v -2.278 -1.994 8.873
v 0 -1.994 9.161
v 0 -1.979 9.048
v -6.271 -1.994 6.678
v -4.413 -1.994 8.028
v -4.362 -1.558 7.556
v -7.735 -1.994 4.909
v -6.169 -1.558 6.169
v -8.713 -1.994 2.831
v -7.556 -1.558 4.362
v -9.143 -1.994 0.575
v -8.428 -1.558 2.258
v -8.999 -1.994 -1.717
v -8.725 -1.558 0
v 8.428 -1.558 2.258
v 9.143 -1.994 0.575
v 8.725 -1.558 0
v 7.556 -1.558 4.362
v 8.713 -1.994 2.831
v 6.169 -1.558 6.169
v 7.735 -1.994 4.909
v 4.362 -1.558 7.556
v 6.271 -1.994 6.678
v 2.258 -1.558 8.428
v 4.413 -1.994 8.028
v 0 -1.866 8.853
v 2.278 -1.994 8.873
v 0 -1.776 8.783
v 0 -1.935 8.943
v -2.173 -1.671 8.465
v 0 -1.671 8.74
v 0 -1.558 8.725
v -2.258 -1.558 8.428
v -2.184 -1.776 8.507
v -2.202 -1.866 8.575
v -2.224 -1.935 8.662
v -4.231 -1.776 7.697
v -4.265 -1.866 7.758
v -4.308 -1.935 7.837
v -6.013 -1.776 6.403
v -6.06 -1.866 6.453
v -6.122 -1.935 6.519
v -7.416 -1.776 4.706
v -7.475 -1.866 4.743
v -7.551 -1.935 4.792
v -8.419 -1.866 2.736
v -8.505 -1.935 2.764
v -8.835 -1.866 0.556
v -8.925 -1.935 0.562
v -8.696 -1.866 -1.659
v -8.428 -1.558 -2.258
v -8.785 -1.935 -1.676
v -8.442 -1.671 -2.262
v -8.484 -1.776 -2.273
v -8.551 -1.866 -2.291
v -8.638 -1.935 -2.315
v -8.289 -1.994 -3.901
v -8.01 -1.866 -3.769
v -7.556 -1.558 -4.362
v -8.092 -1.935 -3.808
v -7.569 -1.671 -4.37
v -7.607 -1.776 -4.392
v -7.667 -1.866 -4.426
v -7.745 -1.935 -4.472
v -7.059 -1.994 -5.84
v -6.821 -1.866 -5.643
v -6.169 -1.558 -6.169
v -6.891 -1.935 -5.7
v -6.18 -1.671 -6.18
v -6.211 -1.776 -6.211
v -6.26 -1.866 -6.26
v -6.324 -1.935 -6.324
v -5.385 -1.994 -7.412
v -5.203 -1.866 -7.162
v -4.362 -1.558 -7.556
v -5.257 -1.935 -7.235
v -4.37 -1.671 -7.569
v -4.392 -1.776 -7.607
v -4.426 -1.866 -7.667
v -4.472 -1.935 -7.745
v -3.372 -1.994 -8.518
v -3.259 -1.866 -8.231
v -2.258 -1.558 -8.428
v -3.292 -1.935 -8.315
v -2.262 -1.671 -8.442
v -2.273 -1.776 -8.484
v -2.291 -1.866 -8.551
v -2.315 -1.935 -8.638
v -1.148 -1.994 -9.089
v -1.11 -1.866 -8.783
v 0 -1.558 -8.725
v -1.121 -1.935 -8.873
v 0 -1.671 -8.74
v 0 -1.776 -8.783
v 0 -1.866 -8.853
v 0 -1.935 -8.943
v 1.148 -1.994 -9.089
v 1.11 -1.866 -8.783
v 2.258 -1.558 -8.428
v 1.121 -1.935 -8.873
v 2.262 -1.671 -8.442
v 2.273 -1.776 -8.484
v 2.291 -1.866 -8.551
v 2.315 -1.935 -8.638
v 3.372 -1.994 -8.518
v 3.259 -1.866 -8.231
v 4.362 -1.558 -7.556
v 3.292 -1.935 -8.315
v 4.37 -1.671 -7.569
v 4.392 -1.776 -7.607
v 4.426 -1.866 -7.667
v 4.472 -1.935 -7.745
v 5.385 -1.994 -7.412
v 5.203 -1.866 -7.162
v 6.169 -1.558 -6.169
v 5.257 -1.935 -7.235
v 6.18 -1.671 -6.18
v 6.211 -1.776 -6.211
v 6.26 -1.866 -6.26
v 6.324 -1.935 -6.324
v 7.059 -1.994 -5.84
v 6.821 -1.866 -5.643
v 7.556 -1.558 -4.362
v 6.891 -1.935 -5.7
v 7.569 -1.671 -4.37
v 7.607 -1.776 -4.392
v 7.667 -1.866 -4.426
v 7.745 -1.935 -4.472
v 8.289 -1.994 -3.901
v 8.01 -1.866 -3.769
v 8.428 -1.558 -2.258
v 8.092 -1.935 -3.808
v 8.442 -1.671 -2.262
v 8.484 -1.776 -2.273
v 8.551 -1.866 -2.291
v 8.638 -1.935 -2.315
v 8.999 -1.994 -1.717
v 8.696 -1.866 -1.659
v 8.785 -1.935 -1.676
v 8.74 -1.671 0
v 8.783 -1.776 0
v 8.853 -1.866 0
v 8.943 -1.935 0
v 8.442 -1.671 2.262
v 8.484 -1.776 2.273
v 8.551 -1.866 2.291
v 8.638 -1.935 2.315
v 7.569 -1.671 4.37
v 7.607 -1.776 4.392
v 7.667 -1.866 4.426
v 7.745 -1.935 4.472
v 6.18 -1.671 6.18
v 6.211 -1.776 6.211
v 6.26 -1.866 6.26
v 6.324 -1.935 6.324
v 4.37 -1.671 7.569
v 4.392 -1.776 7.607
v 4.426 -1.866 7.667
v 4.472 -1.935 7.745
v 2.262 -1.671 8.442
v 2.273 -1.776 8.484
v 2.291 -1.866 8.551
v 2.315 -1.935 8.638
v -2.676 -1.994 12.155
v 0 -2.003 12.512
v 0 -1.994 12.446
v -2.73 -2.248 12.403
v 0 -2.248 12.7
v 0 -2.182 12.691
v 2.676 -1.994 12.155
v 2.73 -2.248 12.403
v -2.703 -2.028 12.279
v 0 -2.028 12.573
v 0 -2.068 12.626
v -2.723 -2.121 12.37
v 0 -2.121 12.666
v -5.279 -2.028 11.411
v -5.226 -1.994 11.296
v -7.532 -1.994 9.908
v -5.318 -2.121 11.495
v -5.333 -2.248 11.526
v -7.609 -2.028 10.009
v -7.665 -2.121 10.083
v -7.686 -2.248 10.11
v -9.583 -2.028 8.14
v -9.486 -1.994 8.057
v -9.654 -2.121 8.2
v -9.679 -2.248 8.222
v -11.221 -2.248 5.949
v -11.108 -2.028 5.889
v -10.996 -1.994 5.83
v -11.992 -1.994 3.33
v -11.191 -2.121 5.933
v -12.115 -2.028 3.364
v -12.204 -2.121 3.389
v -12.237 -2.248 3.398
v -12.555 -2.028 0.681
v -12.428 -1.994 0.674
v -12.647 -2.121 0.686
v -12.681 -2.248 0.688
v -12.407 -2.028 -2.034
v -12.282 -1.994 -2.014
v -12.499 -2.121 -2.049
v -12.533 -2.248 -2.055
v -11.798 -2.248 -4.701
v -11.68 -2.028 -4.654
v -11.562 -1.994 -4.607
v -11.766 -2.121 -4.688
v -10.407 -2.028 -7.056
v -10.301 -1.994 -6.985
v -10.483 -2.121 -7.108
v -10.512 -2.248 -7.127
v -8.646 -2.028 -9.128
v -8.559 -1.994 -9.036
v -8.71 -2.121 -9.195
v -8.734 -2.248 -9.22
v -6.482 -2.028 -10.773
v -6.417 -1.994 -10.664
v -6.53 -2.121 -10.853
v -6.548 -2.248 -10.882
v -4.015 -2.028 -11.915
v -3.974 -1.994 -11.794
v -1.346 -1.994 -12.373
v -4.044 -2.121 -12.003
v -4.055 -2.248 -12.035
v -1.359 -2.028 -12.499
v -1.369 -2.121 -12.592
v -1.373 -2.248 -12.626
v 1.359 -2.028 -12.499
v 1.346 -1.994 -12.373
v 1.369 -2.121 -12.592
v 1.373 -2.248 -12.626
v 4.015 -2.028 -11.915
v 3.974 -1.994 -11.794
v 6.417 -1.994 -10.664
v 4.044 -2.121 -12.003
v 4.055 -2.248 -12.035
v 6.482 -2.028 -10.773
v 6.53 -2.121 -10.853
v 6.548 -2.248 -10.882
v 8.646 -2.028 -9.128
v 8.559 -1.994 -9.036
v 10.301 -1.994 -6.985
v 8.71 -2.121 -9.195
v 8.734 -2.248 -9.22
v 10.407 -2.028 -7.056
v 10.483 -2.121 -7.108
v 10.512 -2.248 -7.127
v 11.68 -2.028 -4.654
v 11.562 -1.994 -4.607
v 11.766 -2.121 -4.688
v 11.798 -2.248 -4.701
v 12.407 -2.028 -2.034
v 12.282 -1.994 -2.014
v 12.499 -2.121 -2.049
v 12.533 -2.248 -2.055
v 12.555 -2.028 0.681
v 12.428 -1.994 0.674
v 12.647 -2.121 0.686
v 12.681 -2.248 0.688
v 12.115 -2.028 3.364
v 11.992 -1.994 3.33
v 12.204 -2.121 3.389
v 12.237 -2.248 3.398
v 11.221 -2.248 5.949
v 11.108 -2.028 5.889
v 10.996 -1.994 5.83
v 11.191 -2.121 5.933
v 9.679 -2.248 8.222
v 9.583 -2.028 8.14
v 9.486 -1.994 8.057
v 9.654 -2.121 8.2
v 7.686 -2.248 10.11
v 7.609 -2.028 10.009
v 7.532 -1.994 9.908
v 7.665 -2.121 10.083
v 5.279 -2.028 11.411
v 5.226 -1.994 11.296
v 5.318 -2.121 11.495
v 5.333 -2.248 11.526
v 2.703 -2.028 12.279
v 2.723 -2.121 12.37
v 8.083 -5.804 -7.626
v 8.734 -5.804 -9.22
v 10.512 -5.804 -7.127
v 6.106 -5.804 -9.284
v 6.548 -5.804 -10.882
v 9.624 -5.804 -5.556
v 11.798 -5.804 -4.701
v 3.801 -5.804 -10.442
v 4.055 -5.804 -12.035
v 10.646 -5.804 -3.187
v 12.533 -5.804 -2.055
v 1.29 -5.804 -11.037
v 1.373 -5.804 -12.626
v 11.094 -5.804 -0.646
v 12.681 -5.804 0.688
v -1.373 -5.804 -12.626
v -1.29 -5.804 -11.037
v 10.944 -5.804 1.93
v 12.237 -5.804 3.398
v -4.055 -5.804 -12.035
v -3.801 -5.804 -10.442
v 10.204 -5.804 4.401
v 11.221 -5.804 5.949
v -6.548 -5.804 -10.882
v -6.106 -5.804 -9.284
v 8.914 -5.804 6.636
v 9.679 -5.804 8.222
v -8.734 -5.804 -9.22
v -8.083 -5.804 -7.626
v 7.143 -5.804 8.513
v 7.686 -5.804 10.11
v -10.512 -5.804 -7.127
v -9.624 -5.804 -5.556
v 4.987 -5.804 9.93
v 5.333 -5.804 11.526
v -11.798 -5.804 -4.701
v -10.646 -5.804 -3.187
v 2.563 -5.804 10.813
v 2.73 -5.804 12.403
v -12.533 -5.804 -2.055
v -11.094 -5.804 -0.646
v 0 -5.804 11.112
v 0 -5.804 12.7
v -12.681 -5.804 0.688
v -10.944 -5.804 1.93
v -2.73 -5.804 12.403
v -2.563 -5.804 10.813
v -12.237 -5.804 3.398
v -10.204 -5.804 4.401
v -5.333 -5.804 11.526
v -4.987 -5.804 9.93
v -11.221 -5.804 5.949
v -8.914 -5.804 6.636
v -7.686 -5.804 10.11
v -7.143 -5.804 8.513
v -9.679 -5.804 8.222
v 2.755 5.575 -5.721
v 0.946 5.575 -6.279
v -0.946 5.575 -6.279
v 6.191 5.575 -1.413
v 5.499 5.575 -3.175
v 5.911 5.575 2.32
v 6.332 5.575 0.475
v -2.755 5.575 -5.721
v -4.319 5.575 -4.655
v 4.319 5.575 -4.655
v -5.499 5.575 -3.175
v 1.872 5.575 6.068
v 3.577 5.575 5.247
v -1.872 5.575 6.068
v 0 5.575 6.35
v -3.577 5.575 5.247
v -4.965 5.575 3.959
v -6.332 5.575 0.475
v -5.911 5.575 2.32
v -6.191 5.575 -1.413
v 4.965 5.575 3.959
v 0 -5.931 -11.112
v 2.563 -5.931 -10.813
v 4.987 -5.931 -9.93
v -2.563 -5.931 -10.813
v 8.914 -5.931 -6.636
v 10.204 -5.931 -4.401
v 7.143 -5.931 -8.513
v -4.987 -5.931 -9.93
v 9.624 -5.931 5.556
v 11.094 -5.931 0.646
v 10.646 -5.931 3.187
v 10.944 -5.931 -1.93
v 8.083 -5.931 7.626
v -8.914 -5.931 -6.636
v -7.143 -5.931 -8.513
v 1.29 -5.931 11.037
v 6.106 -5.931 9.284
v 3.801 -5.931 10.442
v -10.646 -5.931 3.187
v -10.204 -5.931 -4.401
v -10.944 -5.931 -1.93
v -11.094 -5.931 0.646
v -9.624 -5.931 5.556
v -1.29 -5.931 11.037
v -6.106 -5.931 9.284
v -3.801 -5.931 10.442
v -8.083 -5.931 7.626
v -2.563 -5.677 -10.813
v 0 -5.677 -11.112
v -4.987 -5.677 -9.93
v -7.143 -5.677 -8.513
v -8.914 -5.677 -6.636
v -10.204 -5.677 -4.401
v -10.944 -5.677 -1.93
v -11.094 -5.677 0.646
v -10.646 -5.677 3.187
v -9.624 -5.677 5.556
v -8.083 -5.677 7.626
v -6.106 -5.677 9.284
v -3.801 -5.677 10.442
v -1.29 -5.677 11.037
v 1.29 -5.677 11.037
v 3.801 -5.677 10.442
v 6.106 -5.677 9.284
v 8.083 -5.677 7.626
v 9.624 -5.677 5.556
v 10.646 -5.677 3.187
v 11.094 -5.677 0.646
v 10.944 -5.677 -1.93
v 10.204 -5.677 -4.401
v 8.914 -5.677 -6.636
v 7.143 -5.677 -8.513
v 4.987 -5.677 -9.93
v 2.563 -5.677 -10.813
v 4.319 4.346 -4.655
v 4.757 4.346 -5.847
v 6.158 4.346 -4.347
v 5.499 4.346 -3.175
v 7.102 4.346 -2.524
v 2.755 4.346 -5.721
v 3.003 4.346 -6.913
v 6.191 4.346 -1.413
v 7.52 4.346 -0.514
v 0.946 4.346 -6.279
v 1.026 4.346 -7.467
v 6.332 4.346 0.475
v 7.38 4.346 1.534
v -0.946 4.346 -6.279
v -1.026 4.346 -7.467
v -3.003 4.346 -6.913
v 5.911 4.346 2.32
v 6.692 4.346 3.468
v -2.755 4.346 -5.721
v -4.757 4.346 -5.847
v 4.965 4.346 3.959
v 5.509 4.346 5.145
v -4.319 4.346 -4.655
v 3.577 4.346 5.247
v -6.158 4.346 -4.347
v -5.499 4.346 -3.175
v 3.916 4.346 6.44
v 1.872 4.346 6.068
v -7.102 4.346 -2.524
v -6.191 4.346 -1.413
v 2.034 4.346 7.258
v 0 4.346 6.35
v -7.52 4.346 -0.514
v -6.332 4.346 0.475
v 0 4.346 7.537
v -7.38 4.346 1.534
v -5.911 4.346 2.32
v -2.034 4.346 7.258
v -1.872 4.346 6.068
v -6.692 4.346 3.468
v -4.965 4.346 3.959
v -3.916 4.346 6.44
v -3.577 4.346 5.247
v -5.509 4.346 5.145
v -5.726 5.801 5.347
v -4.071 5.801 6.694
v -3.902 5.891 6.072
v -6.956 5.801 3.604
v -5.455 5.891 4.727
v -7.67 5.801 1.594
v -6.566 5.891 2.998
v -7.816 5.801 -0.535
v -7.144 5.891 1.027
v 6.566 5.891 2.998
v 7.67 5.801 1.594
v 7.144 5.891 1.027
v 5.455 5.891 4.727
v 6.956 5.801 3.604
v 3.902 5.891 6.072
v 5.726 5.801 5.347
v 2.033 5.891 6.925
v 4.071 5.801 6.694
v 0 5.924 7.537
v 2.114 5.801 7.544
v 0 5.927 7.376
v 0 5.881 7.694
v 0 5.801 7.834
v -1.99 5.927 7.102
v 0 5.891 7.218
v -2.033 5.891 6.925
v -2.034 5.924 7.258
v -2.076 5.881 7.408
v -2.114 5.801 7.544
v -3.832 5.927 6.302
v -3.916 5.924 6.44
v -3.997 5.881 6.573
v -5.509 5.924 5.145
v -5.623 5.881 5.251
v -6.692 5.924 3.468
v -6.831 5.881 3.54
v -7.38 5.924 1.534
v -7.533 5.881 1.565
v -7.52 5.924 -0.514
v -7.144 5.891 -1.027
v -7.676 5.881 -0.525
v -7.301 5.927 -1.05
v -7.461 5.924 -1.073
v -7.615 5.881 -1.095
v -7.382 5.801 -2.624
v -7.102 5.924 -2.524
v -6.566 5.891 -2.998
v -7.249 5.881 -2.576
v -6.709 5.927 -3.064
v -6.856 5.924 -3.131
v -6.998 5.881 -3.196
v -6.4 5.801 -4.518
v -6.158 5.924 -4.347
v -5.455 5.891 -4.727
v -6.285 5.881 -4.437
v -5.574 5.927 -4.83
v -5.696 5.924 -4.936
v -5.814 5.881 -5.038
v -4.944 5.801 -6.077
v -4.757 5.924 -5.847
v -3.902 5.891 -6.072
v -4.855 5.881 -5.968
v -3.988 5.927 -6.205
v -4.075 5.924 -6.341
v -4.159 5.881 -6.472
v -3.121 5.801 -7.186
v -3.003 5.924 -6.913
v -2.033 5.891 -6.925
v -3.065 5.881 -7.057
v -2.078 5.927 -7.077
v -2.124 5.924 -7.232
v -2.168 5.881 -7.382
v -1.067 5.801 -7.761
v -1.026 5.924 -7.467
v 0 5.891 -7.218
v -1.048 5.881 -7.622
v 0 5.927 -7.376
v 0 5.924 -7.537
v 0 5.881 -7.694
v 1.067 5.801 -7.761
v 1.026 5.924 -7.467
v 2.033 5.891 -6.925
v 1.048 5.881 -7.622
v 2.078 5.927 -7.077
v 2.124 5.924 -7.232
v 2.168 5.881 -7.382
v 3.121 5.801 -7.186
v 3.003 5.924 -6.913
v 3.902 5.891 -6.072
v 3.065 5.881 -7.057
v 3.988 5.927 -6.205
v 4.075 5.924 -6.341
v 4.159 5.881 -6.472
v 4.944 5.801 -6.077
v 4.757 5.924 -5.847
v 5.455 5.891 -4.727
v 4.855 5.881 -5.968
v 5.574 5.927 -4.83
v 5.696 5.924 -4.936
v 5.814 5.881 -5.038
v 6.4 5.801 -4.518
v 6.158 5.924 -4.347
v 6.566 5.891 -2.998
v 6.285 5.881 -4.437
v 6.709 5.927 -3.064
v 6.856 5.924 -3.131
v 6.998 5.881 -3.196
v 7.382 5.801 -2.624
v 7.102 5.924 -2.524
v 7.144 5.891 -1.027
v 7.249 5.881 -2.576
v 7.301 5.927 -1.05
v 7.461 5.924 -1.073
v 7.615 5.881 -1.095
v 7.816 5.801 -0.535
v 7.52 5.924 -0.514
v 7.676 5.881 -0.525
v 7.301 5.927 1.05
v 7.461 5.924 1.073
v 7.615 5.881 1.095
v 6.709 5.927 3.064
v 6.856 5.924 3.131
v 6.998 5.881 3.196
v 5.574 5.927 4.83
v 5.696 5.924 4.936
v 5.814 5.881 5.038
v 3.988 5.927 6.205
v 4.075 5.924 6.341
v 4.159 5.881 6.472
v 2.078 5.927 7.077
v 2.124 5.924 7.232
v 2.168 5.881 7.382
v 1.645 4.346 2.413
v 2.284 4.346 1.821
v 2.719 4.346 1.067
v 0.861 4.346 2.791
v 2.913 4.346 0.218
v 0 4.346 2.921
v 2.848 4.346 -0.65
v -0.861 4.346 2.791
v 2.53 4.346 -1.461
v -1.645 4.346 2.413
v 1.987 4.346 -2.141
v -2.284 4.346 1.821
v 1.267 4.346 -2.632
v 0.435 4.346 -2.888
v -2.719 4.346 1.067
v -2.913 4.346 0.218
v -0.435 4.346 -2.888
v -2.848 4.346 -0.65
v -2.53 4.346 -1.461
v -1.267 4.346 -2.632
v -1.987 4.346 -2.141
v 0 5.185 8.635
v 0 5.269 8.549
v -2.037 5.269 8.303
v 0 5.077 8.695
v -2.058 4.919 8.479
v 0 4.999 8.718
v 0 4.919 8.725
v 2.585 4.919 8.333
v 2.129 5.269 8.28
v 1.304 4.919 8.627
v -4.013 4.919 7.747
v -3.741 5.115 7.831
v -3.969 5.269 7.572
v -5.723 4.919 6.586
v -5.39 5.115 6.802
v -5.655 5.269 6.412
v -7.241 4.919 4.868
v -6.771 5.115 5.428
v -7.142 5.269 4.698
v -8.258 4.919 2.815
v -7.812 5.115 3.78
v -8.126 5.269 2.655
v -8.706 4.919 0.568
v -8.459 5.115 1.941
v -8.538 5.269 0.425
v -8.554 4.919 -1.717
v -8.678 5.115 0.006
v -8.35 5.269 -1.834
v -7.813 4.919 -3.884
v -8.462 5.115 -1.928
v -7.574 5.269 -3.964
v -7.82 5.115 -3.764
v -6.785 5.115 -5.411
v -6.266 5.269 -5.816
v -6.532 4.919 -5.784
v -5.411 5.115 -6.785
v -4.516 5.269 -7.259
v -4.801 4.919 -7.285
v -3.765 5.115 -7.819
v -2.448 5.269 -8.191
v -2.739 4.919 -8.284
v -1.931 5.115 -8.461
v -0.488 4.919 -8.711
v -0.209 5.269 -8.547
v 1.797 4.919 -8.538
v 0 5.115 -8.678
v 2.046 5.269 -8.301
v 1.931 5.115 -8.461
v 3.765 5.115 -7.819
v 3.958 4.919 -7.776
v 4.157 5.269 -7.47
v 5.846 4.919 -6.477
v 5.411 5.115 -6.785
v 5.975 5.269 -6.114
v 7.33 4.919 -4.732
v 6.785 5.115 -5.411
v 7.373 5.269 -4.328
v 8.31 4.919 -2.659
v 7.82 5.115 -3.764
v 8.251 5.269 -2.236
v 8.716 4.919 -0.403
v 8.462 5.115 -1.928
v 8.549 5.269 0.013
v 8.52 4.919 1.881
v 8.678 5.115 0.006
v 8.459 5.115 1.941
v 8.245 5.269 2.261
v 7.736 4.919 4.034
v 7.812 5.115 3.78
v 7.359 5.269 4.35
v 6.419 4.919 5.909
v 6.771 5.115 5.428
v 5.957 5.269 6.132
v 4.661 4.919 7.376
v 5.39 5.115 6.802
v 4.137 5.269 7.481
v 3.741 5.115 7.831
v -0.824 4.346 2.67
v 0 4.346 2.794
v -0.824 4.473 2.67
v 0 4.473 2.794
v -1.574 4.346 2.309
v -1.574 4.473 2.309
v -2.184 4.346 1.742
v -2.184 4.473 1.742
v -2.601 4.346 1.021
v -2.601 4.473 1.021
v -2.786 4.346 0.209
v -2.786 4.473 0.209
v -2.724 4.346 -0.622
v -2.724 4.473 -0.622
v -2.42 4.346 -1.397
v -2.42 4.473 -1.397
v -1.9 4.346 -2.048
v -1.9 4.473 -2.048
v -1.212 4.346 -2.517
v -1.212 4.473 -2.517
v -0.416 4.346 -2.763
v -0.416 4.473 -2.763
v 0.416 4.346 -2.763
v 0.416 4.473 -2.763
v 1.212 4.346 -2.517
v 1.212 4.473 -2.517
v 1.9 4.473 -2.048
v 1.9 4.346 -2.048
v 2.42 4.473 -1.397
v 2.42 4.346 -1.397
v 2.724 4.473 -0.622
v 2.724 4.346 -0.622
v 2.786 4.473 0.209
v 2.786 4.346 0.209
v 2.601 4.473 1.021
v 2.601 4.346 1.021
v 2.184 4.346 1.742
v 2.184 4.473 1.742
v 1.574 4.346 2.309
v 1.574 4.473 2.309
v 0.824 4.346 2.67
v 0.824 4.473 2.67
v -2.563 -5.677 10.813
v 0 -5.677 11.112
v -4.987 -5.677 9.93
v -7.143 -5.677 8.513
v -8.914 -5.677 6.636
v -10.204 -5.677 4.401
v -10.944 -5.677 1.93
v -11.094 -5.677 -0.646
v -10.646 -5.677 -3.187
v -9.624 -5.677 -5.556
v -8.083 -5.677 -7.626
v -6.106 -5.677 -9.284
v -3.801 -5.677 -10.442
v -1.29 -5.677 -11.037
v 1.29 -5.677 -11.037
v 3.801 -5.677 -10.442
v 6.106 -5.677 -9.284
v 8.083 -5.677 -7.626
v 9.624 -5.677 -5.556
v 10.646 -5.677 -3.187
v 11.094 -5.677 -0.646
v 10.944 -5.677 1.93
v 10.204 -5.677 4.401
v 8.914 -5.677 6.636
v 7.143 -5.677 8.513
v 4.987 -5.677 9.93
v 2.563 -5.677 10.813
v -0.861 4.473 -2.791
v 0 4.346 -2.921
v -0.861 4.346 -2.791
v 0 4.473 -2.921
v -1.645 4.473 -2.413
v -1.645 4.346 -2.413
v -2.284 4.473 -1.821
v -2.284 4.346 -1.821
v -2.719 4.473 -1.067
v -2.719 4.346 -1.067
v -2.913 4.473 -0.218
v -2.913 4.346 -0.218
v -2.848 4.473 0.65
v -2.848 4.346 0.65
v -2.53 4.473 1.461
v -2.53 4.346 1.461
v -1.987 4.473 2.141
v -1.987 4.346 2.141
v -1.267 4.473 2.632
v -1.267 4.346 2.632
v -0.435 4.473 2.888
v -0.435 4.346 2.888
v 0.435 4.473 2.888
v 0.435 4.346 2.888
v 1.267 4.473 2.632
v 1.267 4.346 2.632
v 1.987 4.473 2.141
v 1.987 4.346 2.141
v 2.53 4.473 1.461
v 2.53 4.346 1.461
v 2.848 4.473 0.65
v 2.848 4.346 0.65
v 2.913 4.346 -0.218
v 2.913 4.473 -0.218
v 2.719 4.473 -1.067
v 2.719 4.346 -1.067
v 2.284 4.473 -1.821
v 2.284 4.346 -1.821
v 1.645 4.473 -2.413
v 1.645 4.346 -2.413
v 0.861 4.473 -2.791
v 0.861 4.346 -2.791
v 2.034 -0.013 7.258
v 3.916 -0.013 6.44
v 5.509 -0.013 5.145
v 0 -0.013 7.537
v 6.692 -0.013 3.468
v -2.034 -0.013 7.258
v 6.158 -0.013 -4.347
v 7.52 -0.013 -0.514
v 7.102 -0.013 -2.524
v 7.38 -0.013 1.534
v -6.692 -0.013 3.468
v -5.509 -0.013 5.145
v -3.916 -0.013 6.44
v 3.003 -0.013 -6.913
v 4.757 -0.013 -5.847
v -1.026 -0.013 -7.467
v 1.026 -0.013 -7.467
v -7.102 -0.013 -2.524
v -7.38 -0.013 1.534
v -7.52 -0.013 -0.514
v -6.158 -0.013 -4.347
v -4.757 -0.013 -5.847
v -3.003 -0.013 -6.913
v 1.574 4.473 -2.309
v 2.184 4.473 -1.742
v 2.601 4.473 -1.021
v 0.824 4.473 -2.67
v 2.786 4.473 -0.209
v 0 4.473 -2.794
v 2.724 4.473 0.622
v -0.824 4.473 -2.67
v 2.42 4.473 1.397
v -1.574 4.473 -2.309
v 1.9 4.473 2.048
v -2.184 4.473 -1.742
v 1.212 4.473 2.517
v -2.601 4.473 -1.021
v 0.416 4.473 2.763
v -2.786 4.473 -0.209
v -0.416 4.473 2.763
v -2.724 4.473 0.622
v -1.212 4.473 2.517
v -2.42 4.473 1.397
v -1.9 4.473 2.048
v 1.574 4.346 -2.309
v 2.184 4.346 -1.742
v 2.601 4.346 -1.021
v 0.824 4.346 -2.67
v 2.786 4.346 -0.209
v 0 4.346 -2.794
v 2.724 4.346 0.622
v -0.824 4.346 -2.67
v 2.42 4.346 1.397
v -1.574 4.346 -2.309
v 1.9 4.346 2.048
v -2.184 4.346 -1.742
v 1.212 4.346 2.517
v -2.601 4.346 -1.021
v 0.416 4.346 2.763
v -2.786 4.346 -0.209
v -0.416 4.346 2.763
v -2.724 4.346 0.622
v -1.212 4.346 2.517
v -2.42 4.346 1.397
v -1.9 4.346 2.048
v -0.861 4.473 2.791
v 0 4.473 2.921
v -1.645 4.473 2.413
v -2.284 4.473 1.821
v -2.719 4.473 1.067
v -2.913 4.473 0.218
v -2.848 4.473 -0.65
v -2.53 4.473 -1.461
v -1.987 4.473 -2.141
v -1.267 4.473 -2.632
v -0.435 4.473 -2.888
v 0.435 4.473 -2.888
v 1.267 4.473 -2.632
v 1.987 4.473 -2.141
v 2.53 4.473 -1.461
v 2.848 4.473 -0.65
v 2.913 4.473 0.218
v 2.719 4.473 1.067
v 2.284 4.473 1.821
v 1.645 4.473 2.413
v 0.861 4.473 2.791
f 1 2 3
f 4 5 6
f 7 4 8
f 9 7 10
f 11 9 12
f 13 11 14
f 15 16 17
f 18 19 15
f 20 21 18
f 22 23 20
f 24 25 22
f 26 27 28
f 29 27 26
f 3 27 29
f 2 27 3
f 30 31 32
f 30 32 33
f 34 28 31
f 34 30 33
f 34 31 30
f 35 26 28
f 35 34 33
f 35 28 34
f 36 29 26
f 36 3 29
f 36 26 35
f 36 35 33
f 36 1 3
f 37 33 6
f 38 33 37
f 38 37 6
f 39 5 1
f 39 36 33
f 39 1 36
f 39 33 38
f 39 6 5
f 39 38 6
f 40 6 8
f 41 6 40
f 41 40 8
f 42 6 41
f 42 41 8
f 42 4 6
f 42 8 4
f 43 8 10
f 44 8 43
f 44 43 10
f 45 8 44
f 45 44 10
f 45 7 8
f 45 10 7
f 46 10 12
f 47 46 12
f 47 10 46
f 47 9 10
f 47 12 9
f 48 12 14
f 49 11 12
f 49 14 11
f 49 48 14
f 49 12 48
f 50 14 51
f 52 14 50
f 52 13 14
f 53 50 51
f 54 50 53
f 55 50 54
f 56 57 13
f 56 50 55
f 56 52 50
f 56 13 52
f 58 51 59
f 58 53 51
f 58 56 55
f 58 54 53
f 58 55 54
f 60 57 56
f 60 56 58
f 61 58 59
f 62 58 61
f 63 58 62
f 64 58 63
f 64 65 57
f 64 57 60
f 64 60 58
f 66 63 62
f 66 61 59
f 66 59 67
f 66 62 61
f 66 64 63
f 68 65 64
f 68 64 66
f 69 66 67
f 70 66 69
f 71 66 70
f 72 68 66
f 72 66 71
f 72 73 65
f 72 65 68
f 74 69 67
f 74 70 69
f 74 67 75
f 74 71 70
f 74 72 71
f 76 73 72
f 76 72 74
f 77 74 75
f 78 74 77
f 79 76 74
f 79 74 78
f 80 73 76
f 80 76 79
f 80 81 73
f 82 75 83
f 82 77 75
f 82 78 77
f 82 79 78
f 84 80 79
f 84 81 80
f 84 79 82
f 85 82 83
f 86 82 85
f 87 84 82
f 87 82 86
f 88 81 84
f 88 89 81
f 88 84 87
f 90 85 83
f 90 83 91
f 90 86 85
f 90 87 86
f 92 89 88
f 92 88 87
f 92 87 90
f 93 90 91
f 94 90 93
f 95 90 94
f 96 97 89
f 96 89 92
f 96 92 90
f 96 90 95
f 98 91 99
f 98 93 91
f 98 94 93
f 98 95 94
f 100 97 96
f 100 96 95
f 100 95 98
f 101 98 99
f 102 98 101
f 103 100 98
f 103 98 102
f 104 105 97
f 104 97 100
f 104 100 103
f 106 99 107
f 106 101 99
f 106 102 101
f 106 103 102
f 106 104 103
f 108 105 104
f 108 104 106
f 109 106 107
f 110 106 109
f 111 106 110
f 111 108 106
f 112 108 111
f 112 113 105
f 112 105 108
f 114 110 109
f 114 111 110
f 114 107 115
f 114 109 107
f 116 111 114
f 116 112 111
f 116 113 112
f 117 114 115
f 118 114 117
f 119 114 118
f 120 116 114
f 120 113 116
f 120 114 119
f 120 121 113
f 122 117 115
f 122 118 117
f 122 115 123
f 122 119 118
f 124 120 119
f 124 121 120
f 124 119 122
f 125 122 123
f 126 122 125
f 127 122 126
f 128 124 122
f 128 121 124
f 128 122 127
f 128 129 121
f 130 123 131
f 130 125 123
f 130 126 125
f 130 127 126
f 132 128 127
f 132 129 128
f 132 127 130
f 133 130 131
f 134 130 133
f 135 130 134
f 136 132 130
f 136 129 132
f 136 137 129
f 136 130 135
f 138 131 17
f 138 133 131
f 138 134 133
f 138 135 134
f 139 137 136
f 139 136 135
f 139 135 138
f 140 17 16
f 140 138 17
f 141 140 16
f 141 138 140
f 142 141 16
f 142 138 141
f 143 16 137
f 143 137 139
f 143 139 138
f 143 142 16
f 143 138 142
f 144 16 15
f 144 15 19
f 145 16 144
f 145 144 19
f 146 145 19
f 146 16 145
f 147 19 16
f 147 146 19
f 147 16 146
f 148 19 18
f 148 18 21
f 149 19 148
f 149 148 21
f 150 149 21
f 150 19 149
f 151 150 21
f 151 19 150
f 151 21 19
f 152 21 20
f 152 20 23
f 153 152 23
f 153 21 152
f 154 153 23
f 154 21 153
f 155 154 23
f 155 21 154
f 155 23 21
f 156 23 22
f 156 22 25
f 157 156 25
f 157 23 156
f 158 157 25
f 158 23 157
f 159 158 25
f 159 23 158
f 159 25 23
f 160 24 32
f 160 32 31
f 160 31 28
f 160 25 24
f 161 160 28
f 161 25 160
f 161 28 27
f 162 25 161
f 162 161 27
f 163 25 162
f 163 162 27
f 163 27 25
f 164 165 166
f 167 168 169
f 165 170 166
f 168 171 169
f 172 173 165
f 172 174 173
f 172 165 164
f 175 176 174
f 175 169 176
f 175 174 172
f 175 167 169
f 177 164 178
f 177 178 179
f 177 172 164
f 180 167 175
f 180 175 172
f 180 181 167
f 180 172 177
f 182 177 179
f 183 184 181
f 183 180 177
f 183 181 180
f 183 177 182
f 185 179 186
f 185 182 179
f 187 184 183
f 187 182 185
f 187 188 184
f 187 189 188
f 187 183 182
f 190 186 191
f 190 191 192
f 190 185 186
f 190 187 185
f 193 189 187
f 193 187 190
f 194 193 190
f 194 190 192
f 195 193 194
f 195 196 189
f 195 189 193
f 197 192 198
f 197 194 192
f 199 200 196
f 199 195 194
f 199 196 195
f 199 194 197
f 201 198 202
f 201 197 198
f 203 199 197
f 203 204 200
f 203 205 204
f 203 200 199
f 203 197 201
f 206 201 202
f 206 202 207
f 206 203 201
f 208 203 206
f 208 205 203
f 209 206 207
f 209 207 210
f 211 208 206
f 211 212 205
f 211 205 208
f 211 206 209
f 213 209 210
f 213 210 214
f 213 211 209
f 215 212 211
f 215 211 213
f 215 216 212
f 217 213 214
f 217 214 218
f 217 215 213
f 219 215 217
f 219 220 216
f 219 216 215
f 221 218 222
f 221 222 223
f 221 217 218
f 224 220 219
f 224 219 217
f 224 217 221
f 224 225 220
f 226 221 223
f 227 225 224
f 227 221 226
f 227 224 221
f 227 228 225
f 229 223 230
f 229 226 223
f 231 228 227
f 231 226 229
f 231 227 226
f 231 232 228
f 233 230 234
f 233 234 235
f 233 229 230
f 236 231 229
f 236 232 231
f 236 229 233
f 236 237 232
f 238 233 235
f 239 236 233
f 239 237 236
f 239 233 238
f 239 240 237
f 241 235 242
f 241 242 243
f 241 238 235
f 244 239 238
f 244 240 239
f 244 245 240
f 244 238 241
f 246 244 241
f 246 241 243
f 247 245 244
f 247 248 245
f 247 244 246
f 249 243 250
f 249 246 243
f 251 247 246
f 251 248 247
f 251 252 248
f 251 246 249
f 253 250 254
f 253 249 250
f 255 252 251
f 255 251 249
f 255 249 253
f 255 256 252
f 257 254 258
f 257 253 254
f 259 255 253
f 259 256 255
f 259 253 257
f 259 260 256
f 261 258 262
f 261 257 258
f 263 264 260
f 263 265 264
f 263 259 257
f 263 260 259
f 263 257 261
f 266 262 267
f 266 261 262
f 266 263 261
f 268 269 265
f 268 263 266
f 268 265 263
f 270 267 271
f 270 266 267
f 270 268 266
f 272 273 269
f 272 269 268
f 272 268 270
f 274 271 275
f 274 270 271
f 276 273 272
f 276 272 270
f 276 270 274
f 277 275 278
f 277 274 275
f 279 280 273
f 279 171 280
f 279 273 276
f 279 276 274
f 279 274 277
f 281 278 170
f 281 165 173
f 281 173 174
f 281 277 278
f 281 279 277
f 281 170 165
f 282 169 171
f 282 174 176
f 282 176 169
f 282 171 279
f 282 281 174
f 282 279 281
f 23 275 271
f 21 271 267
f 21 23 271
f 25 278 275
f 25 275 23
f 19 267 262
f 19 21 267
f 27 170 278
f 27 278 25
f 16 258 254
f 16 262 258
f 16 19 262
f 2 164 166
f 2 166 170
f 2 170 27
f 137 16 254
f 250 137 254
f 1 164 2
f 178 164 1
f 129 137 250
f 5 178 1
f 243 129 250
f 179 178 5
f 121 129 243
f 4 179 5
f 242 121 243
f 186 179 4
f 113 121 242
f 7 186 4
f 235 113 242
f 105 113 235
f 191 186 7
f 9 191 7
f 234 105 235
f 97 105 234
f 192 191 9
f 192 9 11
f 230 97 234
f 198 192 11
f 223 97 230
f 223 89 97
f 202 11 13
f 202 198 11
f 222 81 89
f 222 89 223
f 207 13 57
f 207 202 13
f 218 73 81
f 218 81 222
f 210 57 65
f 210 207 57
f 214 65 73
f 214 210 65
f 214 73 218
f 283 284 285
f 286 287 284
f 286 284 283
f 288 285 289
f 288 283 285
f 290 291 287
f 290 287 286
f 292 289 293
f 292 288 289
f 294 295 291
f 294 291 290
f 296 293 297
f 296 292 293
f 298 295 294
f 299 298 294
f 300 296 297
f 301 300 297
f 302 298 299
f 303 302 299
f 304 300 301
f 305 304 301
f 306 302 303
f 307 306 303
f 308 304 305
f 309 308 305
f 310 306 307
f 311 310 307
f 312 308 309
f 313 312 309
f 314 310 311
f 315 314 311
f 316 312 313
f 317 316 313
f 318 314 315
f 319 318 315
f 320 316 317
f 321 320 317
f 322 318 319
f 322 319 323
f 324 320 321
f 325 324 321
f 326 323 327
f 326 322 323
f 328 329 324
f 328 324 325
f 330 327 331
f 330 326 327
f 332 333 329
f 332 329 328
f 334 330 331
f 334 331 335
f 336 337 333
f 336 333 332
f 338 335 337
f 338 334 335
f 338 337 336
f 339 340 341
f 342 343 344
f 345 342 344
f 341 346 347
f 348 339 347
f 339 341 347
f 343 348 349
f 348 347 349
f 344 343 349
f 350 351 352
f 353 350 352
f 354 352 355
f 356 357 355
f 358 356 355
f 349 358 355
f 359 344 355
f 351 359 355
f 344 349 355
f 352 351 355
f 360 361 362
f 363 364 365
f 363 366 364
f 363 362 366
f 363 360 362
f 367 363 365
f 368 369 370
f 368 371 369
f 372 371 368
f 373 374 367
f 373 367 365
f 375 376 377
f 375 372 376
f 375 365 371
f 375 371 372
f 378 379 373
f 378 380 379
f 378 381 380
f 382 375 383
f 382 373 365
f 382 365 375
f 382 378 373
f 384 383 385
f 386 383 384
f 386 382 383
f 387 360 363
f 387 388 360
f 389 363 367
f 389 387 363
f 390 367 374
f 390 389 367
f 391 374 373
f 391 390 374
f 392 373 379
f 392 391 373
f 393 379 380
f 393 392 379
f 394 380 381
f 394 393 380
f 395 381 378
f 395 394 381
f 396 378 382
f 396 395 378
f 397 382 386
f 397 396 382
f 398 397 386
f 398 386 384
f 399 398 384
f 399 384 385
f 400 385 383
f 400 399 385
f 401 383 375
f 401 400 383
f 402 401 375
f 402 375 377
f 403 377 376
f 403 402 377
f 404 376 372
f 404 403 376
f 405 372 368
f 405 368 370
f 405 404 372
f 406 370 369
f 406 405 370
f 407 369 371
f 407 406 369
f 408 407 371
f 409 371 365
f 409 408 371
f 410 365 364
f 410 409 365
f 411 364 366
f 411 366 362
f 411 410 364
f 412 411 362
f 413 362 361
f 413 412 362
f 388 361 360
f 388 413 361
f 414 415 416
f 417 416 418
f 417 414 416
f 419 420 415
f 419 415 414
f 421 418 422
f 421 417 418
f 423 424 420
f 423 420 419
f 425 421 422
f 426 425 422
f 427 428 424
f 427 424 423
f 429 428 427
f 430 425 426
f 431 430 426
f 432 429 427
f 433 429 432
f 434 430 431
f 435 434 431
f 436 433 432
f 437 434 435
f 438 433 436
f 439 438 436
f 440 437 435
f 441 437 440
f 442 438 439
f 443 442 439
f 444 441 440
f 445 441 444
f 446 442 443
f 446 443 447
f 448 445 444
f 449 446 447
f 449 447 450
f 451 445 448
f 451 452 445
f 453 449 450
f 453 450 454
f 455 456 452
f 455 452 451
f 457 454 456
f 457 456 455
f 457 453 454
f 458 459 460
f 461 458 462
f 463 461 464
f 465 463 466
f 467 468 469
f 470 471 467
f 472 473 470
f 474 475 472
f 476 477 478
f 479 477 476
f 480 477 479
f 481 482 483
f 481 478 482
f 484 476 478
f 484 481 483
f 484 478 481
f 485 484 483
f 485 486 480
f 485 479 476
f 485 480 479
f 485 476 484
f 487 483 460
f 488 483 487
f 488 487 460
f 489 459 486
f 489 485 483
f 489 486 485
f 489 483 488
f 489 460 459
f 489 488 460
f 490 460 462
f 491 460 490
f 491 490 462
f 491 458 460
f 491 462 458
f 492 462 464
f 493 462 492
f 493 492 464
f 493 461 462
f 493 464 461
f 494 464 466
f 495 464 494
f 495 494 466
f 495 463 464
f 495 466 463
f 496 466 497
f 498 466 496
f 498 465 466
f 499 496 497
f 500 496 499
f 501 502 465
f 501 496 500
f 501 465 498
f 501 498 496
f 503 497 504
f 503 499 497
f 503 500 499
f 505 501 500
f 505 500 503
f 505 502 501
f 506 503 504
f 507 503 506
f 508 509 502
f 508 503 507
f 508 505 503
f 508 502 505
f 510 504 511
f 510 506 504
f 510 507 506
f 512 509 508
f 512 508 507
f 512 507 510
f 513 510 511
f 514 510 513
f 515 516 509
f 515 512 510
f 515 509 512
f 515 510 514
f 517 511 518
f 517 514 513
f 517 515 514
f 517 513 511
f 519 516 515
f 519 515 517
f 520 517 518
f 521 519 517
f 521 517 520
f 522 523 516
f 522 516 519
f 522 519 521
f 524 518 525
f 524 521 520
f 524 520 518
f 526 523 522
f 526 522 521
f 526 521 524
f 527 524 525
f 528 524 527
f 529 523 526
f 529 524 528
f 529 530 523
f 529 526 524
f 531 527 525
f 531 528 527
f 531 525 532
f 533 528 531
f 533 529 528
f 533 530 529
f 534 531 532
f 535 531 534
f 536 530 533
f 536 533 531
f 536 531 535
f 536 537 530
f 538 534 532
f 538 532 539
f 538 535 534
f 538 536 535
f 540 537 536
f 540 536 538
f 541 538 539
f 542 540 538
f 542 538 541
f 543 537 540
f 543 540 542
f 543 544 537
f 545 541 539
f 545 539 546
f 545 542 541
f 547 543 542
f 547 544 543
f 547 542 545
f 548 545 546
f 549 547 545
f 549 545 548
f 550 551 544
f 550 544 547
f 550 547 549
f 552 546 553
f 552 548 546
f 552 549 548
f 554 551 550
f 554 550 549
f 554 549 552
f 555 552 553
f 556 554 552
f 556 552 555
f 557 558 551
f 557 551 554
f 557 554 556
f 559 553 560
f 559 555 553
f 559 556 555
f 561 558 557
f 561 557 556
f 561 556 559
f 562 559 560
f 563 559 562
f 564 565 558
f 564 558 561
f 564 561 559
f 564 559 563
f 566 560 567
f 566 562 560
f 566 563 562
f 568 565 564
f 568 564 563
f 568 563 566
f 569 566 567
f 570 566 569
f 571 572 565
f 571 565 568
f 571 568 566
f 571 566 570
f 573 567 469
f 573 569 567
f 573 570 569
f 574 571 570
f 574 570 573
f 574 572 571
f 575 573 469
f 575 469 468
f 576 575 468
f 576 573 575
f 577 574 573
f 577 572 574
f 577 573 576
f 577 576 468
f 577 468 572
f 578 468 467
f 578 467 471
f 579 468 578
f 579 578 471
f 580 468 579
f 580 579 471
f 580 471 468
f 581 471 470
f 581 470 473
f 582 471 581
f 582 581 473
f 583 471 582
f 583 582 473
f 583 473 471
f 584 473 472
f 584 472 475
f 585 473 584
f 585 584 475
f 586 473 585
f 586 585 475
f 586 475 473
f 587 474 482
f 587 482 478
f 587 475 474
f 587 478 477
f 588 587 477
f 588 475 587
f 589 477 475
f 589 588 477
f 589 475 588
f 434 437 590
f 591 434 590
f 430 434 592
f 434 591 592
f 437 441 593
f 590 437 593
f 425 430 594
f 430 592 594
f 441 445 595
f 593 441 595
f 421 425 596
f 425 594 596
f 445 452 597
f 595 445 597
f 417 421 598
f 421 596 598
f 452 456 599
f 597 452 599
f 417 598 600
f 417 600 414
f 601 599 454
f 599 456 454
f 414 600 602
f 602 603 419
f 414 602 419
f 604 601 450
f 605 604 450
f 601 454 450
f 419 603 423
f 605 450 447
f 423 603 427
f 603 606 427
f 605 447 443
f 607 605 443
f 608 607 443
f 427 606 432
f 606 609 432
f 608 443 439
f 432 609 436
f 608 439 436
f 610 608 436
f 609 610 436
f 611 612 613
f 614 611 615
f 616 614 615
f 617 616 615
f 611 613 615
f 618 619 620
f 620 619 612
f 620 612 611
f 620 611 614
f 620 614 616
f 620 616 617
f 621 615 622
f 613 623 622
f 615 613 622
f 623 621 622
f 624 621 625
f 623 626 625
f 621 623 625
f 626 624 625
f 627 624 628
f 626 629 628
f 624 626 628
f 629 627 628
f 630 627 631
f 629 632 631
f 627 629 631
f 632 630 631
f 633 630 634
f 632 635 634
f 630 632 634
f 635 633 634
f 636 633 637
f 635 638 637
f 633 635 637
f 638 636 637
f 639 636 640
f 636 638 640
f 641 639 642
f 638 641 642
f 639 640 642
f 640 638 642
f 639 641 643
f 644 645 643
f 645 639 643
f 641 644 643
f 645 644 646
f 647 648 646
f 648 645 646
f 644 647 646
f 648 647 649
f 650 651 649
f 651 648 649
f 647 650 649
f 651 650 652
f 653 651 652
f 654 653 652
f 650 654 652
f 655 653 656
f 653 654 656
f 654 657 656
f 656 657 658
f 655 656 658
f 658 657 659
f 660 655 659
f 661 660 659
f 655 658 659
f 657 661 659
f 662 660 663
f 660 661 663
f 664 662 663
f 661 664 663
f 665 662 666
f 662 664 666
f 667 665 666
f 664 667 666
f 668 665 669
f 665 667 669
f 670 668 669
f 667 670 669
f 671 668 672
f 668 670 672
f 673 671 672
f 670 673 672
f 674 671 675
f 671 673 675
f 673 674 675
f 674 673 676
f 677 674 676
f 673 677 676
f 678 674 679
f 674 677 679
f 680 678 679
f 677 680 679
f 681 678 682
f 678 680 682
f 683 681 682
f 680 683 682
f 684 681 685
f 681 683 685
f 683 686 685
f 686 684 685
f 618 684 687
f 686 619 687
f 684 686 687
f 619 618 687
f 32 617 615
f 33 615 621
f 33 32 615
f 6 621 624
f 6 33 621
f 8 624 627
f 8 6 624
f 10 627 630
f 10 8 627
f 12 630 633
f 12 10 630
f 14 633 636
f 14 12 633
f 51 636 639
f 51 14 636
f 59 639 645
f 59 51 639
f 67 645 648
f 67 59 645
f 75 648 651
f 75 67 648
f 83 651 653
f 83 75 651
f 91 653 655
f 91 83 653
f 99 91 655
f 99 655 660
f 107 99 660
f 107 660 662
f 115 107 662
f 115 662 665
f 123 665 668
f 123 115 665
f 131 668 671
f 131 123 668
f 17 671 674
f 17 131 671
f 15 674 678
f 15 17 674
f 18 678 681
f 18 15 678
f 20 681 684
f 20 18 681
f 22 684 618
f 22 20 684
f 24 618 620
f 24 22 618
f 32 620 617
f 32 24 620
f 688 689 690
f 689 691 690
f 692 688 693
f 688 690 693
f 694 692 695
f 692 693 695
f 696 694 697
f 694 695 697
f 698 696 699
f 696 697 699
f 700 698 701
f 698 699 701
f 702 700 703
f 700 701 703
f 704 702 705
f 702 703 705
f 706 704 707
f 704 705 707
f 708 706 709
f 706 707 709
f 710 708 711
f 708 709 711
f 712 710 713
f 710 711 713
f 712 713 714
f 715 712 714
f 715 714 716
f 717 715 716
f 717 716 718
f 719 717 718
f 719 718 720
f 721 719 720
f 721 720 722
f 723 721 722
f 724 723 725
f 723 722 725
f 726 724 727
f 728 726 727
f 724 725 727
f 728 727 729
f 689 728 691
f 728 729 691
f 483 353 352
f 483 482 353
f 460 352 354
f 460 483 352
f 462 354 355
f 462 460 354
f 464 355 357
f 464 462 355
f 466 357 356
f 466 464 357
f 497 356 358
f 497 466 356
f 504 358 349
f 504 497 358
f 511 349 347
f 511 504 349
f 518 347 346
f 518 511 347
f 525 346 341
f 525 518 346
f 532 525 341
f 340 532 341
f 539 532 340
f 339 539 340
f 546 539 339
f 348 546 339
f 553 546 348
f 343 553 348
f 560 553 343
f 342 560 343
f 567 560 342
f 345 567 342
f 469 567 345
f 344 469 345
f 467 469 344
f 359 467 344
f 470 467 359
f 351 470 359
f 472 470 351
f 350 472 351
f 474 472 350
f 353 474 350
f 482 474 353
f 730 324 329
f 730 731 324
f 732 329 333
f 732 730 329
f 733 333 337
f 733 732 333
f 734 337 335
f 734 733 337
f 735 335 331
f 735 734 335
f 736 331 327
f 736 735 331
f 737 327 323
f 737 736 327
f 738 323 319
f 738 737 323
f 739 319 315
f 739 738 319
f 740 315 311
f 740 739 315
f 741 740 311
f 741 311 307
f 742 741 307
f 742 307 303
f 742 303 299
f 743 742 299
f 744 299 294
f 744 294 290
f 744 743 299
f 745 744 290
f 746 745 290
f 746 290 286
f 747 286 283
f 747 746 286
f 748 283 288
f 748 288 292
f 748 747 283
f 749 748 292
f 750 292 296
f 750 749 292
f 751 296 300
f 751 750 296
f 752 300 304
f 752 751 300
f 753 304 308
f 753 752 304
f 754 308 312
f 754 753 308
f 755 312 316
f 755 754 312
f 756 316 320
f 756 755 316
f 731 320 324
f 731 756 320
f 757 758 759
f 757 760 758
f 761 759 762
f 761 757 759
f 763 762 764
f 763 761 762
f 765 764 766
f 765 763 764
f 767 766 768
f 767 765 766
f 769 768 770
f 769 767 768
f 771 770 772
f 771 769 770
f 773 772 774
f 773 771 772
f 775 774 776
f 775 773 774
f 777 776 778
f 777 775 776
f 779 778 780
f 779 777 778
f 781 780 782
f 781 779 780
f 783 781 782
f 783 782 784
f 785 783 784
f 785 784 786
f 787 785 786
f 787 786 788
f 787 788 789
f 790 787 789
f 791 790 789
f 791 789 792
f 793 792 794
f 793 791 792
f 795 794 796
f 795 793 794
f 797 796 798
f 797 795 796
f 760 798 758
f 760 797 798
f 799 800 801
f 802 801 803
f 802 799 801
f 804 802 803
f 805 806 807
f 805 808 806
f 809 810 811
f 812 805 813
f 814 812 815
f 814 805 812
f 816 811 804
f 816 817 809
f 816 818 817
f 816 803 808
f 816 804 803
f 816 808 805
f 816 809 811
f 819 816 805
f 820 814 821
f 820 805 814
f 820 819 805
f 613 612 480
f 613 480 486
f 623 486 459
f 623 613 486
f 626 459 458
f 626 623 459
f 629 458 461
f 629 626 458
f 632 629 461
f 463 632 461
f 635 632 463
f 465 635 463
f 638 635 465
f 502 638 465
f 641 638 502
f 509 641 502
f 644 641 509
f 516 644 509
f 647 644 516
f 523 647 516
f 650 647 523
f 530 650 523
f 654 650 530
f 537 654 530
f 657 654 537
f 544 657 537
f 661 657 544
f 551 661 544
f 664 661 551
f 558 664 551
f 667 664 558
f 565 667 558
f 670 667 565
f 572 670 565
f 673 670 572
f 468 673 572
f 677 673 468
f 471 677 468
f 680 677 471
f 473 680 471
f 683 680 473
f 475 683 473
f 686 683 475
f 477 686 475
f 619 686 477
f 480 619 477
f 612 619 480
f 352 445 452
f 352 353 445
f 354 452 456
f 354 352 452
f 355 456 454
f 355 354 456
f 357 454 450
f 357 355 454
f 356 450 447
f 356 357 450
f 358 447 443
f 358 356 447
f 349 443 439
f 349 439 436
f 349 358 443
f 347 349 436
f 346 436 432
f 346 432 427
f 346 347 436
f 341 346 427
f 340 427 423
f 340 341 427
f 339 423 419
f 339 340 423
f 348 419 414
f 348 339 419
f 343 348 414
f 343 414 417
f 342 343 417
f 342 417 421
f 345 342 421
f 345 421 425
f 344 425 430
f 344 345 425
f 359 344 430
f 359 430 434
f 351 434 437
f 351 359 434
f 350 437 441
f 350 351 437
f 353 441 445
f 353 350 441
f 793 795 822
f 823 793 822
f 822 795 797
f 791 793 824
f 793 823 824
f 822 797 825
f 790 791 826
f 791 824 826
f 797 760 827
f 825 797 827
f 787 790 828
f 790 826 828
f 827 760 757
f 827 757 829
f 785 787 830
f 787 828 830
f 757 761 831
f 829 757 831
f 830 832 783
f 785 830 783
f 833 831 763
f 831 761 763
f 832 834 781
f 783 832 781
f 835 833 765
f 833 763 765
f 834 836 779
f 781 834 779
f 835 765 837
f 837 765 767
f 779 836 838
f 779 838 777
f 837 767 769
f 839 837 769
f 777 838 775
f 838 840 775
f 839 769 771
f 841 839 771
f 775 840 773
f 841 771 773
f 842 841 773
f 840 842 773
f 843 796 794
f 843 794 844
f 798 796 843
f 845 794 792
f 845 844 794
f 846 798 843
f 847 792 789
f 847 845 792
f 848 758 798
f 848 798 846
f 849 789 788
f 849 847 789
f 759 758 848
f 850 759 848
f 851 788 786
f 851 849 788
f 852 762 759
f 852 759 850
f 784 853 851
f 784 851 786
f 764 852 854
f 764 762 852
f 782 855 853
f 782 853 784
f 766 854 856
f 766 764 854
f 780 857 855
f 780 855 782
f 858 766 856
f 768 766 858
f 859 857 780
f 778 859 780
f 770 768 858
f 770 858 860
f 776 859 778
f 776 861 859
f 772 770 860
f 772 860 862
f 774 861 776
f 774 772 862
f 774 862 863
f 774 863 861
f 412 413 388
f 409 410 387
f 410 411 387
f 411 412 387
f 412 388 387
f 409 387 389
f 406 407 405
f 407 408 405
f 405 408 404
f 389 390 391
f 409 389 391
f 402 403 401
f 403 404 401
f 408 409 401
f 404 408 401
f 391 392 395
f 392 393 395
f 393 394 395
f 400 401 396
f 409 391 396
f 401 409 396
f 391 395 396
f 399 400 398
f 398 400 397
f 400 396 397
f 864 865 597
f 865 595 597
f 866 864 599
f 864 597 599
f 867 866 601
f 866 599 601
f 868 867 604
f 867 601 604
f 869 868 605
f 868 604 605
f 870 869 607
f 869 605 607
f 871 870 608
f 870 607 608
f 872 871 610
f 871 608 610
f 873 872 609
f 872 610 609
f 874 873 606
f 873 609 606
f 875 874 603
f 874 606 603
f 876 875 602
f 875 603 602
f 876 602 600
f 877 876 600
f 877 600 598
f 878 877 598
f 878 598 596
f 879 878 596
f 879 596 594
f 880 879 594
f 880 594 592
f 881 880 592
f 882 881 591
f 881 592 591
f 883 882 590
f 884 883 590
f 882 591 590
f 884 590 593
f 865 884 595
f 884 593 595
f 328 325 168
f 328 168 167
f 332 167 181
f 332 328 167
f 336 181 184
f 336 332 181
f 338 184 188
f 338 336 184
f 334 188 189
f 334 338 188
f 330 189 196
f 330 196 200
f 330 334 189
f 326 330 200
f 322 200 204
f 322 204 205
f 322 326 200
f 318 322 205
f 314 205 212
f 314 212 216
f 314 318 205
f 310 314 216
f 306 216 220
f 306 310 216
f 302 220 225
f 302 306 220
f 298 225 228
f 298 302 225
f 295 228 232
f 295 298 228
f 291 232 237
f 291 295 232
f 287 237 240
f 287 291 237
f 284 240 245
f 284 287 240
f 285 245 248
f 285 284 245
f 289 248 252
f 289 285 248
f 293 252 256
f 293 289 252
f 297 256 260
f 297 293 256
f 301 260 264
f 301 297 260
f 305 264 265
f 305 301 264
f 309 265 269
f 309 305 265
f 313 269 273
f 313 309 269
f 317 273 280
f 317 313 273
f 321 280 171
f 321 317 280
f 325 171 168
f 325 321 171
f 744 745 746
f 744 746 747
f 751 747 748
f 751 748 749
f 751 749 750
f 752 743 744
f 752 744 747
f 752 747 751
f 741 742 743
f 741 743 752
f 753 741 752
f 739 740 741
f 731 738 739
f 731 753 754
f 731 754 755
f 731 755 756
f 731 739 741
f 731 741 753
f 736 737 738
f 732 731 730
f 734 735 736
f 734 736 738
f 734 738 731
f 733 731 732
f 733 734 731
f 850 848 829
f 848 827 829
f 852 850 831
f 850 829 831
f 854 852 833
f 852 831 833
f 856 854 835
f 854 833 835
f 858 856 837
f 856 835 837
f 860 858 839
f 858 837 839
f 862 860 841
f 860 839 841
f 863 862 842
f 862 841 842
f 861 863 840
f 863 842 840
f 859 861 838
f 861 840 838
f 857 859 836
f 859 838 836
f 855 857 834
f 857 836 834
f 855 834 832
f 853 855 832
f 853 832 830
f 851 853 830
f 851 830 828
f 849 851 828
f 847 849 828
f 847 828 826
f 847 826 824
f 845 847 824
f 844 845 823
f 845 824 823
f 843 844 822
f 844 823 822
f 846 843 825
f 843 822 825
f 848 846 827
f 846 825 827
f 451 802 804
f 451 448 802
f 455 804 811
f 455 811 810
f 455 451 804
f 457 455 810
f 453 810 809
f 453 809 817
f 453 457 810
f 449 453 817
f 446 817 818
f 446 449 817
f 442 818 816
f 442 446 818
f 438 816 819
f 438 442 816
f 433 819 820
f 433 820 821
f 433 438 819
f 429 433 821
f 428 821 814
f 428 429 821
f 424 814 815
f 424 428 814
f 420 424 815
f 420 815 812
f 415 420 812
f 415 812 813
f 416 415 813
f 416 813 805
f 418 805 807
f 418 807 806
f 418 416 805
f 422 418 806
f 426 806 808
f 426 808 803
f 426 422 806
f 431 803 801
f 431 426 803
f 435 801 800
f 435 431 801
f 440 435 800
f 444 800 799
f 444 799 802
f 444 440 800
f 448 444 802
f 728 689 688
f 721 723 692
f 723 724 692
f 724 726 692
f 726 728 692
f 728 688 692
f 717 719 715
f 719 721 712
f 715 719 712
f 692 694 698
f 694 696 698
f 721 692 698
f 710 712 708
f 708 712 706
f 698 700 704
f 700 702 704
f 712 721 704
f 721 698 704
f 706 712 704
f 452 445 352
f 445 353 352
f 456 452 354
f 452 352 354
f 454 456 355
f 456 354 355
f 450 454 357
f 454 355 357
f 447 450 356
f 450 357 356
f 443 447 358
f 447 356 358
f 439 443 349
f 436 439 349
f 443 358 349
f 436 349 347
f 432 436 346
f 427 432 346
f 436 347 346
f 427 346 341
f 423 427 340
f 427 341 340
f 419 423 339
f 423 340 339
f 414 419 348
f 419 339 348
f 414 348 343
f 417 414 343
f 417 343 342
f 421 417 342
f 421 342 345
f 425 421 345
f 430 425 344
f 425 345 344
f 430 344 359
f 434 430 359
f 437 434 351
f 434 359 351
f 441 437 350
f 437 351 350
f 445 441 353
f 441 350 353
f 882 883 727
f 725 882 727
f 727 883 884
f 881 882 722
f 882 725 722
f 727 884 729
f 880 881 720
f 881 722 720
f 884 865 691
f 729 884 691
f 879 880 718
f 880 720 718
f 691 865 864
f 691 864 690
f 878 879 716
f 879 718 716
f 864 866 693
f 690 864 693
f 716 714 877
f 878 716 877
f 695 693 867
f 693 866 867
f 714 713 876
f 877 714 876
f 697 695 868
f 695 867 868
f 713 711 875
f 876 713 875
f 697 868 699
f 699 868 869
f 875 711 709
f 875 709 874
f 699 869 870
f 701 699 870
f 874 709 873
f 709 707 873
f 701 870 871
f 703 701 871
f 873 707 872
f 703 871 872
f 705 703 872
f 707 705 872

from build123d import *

# Parameters (mm, degrees)
SKETCH5_W   = 11.1125
SKETCH5_H   = 0.254
SKETCH5_W_2 = 0.127
SKETCH5_H_2 = 0.127
FILLET1_R   = 0.436245
FILLET2_R   = 0.254


with BuildPart() as part:
    # Sketch3 → Revolve1 (revolve)
    with BuildSketch(Plane(origin=(0, 0, 0), x_dir=(0, 0, -1), z_dir=(1, 0, 0)), mode=Mode.PRIVATE) as revolve1_sk:
        with BuildLine():
            Line((6.35, 5.575443959), (7.217819816, 5.891304541))
            ThreePointArc((7.217819816, 5.891304541), (7.53745, 5.923980005), (7.8343125, 5.801082499))
            Line((7.8343125, 5.801082499), (8.7249, 5.13842))
            Line((8.7249, 5.13842), (8.7249, -1.9939))
            Line((8.7249, -1.9939), (12.7, -1.9939))
            Line((12.7, -1.9939), (12.7, -5.8039))
            Line((12.7, -5.8039), (11.1125, -5.8039))
            Line((11.1125, -5.8039), (11.1125, -5.6769))
            Line((11.1125, -5.6769), (0, -5.6769))
            Line((0, -5.6769), (0, -0.0127))
            Line((0, -0.0127), (7.53745, -0.0127))
            Line((7.53745, -0.0127), (7.53745, 4.34594))
            Line((7.53745, 4.34594), (6.35, 4.34594))
            Line((6.35, 4.34594), (6.35, 5.575443959))
        make_face()
    revolve(revolve1_sk.sketch.rotate(Axis((0, -0.0127, 0), (0, -1, 0)), 180), axis=Axis((0, -0.0127, 0), (0, -1, 0)))

    # Fillet1
    fillet1_edges = [part.edges().sort_by_distance(p)[0] for p in [
        (0, 5.13842, -8.7249),
        (0, -1.9939, -8.7249),
    ]]
    fillet(fillet1_edges, radius=FILLET1_R)

    # Fillet2
    fillet2_edges = [part.edges().sort_by_distance(p)[0] for p in [
        (0, -1.9939, -12.7),
    ]]
    fillet(fillet2_edges, radius=FILLET2_R)


with BuildPart() as body_2:
    # Sketch4 → Revolve2 (revolve)
    with BuildSketch(Plane(origin=(0, 0, 0), x_dir=(0, 0, -1), z_dir=(1, 0, 0)), mode=Mode.PRIVATE) as revolve2_sk:
        Polygon((6.35, 5.575443959), (0, 5.575443959), (0, 4.34594), (2.794, 4.34594), (2.794, 4.47294), (2.921, 4.47294), (2.921, 4.34594), (6.35, 4.34594), align=None)
    revolve(revolve2_sk.sketch.rotate(Axis((0, 5.575443959, 0), (0, -1, 0)), 180), axis=Axis((0, 5.575443959, 0), (0, -1, 0)))


with BuildPart() as body_3:
    # Sketch5 → Revolve3 (revolve)
    with BuildSketch(Plane(origin=(0, 0, 0), x_dir=(0, 0, -1), z_dir=(1, 0, 0))):
        with Locations((5.55625, -5.8039)):
            Rectangle(SKETCH5_W, SKETCH5_H)
        with Locations((2.8575, 4.40944)):
            Rectangle(SKETCH5_W_2, SKETCH5_H_2)
    revolve(axis=Axis((0, -5.9309, 0), (0, 1, 0)))


solid = Compound([part.part, body_2.part, body_3.part])
